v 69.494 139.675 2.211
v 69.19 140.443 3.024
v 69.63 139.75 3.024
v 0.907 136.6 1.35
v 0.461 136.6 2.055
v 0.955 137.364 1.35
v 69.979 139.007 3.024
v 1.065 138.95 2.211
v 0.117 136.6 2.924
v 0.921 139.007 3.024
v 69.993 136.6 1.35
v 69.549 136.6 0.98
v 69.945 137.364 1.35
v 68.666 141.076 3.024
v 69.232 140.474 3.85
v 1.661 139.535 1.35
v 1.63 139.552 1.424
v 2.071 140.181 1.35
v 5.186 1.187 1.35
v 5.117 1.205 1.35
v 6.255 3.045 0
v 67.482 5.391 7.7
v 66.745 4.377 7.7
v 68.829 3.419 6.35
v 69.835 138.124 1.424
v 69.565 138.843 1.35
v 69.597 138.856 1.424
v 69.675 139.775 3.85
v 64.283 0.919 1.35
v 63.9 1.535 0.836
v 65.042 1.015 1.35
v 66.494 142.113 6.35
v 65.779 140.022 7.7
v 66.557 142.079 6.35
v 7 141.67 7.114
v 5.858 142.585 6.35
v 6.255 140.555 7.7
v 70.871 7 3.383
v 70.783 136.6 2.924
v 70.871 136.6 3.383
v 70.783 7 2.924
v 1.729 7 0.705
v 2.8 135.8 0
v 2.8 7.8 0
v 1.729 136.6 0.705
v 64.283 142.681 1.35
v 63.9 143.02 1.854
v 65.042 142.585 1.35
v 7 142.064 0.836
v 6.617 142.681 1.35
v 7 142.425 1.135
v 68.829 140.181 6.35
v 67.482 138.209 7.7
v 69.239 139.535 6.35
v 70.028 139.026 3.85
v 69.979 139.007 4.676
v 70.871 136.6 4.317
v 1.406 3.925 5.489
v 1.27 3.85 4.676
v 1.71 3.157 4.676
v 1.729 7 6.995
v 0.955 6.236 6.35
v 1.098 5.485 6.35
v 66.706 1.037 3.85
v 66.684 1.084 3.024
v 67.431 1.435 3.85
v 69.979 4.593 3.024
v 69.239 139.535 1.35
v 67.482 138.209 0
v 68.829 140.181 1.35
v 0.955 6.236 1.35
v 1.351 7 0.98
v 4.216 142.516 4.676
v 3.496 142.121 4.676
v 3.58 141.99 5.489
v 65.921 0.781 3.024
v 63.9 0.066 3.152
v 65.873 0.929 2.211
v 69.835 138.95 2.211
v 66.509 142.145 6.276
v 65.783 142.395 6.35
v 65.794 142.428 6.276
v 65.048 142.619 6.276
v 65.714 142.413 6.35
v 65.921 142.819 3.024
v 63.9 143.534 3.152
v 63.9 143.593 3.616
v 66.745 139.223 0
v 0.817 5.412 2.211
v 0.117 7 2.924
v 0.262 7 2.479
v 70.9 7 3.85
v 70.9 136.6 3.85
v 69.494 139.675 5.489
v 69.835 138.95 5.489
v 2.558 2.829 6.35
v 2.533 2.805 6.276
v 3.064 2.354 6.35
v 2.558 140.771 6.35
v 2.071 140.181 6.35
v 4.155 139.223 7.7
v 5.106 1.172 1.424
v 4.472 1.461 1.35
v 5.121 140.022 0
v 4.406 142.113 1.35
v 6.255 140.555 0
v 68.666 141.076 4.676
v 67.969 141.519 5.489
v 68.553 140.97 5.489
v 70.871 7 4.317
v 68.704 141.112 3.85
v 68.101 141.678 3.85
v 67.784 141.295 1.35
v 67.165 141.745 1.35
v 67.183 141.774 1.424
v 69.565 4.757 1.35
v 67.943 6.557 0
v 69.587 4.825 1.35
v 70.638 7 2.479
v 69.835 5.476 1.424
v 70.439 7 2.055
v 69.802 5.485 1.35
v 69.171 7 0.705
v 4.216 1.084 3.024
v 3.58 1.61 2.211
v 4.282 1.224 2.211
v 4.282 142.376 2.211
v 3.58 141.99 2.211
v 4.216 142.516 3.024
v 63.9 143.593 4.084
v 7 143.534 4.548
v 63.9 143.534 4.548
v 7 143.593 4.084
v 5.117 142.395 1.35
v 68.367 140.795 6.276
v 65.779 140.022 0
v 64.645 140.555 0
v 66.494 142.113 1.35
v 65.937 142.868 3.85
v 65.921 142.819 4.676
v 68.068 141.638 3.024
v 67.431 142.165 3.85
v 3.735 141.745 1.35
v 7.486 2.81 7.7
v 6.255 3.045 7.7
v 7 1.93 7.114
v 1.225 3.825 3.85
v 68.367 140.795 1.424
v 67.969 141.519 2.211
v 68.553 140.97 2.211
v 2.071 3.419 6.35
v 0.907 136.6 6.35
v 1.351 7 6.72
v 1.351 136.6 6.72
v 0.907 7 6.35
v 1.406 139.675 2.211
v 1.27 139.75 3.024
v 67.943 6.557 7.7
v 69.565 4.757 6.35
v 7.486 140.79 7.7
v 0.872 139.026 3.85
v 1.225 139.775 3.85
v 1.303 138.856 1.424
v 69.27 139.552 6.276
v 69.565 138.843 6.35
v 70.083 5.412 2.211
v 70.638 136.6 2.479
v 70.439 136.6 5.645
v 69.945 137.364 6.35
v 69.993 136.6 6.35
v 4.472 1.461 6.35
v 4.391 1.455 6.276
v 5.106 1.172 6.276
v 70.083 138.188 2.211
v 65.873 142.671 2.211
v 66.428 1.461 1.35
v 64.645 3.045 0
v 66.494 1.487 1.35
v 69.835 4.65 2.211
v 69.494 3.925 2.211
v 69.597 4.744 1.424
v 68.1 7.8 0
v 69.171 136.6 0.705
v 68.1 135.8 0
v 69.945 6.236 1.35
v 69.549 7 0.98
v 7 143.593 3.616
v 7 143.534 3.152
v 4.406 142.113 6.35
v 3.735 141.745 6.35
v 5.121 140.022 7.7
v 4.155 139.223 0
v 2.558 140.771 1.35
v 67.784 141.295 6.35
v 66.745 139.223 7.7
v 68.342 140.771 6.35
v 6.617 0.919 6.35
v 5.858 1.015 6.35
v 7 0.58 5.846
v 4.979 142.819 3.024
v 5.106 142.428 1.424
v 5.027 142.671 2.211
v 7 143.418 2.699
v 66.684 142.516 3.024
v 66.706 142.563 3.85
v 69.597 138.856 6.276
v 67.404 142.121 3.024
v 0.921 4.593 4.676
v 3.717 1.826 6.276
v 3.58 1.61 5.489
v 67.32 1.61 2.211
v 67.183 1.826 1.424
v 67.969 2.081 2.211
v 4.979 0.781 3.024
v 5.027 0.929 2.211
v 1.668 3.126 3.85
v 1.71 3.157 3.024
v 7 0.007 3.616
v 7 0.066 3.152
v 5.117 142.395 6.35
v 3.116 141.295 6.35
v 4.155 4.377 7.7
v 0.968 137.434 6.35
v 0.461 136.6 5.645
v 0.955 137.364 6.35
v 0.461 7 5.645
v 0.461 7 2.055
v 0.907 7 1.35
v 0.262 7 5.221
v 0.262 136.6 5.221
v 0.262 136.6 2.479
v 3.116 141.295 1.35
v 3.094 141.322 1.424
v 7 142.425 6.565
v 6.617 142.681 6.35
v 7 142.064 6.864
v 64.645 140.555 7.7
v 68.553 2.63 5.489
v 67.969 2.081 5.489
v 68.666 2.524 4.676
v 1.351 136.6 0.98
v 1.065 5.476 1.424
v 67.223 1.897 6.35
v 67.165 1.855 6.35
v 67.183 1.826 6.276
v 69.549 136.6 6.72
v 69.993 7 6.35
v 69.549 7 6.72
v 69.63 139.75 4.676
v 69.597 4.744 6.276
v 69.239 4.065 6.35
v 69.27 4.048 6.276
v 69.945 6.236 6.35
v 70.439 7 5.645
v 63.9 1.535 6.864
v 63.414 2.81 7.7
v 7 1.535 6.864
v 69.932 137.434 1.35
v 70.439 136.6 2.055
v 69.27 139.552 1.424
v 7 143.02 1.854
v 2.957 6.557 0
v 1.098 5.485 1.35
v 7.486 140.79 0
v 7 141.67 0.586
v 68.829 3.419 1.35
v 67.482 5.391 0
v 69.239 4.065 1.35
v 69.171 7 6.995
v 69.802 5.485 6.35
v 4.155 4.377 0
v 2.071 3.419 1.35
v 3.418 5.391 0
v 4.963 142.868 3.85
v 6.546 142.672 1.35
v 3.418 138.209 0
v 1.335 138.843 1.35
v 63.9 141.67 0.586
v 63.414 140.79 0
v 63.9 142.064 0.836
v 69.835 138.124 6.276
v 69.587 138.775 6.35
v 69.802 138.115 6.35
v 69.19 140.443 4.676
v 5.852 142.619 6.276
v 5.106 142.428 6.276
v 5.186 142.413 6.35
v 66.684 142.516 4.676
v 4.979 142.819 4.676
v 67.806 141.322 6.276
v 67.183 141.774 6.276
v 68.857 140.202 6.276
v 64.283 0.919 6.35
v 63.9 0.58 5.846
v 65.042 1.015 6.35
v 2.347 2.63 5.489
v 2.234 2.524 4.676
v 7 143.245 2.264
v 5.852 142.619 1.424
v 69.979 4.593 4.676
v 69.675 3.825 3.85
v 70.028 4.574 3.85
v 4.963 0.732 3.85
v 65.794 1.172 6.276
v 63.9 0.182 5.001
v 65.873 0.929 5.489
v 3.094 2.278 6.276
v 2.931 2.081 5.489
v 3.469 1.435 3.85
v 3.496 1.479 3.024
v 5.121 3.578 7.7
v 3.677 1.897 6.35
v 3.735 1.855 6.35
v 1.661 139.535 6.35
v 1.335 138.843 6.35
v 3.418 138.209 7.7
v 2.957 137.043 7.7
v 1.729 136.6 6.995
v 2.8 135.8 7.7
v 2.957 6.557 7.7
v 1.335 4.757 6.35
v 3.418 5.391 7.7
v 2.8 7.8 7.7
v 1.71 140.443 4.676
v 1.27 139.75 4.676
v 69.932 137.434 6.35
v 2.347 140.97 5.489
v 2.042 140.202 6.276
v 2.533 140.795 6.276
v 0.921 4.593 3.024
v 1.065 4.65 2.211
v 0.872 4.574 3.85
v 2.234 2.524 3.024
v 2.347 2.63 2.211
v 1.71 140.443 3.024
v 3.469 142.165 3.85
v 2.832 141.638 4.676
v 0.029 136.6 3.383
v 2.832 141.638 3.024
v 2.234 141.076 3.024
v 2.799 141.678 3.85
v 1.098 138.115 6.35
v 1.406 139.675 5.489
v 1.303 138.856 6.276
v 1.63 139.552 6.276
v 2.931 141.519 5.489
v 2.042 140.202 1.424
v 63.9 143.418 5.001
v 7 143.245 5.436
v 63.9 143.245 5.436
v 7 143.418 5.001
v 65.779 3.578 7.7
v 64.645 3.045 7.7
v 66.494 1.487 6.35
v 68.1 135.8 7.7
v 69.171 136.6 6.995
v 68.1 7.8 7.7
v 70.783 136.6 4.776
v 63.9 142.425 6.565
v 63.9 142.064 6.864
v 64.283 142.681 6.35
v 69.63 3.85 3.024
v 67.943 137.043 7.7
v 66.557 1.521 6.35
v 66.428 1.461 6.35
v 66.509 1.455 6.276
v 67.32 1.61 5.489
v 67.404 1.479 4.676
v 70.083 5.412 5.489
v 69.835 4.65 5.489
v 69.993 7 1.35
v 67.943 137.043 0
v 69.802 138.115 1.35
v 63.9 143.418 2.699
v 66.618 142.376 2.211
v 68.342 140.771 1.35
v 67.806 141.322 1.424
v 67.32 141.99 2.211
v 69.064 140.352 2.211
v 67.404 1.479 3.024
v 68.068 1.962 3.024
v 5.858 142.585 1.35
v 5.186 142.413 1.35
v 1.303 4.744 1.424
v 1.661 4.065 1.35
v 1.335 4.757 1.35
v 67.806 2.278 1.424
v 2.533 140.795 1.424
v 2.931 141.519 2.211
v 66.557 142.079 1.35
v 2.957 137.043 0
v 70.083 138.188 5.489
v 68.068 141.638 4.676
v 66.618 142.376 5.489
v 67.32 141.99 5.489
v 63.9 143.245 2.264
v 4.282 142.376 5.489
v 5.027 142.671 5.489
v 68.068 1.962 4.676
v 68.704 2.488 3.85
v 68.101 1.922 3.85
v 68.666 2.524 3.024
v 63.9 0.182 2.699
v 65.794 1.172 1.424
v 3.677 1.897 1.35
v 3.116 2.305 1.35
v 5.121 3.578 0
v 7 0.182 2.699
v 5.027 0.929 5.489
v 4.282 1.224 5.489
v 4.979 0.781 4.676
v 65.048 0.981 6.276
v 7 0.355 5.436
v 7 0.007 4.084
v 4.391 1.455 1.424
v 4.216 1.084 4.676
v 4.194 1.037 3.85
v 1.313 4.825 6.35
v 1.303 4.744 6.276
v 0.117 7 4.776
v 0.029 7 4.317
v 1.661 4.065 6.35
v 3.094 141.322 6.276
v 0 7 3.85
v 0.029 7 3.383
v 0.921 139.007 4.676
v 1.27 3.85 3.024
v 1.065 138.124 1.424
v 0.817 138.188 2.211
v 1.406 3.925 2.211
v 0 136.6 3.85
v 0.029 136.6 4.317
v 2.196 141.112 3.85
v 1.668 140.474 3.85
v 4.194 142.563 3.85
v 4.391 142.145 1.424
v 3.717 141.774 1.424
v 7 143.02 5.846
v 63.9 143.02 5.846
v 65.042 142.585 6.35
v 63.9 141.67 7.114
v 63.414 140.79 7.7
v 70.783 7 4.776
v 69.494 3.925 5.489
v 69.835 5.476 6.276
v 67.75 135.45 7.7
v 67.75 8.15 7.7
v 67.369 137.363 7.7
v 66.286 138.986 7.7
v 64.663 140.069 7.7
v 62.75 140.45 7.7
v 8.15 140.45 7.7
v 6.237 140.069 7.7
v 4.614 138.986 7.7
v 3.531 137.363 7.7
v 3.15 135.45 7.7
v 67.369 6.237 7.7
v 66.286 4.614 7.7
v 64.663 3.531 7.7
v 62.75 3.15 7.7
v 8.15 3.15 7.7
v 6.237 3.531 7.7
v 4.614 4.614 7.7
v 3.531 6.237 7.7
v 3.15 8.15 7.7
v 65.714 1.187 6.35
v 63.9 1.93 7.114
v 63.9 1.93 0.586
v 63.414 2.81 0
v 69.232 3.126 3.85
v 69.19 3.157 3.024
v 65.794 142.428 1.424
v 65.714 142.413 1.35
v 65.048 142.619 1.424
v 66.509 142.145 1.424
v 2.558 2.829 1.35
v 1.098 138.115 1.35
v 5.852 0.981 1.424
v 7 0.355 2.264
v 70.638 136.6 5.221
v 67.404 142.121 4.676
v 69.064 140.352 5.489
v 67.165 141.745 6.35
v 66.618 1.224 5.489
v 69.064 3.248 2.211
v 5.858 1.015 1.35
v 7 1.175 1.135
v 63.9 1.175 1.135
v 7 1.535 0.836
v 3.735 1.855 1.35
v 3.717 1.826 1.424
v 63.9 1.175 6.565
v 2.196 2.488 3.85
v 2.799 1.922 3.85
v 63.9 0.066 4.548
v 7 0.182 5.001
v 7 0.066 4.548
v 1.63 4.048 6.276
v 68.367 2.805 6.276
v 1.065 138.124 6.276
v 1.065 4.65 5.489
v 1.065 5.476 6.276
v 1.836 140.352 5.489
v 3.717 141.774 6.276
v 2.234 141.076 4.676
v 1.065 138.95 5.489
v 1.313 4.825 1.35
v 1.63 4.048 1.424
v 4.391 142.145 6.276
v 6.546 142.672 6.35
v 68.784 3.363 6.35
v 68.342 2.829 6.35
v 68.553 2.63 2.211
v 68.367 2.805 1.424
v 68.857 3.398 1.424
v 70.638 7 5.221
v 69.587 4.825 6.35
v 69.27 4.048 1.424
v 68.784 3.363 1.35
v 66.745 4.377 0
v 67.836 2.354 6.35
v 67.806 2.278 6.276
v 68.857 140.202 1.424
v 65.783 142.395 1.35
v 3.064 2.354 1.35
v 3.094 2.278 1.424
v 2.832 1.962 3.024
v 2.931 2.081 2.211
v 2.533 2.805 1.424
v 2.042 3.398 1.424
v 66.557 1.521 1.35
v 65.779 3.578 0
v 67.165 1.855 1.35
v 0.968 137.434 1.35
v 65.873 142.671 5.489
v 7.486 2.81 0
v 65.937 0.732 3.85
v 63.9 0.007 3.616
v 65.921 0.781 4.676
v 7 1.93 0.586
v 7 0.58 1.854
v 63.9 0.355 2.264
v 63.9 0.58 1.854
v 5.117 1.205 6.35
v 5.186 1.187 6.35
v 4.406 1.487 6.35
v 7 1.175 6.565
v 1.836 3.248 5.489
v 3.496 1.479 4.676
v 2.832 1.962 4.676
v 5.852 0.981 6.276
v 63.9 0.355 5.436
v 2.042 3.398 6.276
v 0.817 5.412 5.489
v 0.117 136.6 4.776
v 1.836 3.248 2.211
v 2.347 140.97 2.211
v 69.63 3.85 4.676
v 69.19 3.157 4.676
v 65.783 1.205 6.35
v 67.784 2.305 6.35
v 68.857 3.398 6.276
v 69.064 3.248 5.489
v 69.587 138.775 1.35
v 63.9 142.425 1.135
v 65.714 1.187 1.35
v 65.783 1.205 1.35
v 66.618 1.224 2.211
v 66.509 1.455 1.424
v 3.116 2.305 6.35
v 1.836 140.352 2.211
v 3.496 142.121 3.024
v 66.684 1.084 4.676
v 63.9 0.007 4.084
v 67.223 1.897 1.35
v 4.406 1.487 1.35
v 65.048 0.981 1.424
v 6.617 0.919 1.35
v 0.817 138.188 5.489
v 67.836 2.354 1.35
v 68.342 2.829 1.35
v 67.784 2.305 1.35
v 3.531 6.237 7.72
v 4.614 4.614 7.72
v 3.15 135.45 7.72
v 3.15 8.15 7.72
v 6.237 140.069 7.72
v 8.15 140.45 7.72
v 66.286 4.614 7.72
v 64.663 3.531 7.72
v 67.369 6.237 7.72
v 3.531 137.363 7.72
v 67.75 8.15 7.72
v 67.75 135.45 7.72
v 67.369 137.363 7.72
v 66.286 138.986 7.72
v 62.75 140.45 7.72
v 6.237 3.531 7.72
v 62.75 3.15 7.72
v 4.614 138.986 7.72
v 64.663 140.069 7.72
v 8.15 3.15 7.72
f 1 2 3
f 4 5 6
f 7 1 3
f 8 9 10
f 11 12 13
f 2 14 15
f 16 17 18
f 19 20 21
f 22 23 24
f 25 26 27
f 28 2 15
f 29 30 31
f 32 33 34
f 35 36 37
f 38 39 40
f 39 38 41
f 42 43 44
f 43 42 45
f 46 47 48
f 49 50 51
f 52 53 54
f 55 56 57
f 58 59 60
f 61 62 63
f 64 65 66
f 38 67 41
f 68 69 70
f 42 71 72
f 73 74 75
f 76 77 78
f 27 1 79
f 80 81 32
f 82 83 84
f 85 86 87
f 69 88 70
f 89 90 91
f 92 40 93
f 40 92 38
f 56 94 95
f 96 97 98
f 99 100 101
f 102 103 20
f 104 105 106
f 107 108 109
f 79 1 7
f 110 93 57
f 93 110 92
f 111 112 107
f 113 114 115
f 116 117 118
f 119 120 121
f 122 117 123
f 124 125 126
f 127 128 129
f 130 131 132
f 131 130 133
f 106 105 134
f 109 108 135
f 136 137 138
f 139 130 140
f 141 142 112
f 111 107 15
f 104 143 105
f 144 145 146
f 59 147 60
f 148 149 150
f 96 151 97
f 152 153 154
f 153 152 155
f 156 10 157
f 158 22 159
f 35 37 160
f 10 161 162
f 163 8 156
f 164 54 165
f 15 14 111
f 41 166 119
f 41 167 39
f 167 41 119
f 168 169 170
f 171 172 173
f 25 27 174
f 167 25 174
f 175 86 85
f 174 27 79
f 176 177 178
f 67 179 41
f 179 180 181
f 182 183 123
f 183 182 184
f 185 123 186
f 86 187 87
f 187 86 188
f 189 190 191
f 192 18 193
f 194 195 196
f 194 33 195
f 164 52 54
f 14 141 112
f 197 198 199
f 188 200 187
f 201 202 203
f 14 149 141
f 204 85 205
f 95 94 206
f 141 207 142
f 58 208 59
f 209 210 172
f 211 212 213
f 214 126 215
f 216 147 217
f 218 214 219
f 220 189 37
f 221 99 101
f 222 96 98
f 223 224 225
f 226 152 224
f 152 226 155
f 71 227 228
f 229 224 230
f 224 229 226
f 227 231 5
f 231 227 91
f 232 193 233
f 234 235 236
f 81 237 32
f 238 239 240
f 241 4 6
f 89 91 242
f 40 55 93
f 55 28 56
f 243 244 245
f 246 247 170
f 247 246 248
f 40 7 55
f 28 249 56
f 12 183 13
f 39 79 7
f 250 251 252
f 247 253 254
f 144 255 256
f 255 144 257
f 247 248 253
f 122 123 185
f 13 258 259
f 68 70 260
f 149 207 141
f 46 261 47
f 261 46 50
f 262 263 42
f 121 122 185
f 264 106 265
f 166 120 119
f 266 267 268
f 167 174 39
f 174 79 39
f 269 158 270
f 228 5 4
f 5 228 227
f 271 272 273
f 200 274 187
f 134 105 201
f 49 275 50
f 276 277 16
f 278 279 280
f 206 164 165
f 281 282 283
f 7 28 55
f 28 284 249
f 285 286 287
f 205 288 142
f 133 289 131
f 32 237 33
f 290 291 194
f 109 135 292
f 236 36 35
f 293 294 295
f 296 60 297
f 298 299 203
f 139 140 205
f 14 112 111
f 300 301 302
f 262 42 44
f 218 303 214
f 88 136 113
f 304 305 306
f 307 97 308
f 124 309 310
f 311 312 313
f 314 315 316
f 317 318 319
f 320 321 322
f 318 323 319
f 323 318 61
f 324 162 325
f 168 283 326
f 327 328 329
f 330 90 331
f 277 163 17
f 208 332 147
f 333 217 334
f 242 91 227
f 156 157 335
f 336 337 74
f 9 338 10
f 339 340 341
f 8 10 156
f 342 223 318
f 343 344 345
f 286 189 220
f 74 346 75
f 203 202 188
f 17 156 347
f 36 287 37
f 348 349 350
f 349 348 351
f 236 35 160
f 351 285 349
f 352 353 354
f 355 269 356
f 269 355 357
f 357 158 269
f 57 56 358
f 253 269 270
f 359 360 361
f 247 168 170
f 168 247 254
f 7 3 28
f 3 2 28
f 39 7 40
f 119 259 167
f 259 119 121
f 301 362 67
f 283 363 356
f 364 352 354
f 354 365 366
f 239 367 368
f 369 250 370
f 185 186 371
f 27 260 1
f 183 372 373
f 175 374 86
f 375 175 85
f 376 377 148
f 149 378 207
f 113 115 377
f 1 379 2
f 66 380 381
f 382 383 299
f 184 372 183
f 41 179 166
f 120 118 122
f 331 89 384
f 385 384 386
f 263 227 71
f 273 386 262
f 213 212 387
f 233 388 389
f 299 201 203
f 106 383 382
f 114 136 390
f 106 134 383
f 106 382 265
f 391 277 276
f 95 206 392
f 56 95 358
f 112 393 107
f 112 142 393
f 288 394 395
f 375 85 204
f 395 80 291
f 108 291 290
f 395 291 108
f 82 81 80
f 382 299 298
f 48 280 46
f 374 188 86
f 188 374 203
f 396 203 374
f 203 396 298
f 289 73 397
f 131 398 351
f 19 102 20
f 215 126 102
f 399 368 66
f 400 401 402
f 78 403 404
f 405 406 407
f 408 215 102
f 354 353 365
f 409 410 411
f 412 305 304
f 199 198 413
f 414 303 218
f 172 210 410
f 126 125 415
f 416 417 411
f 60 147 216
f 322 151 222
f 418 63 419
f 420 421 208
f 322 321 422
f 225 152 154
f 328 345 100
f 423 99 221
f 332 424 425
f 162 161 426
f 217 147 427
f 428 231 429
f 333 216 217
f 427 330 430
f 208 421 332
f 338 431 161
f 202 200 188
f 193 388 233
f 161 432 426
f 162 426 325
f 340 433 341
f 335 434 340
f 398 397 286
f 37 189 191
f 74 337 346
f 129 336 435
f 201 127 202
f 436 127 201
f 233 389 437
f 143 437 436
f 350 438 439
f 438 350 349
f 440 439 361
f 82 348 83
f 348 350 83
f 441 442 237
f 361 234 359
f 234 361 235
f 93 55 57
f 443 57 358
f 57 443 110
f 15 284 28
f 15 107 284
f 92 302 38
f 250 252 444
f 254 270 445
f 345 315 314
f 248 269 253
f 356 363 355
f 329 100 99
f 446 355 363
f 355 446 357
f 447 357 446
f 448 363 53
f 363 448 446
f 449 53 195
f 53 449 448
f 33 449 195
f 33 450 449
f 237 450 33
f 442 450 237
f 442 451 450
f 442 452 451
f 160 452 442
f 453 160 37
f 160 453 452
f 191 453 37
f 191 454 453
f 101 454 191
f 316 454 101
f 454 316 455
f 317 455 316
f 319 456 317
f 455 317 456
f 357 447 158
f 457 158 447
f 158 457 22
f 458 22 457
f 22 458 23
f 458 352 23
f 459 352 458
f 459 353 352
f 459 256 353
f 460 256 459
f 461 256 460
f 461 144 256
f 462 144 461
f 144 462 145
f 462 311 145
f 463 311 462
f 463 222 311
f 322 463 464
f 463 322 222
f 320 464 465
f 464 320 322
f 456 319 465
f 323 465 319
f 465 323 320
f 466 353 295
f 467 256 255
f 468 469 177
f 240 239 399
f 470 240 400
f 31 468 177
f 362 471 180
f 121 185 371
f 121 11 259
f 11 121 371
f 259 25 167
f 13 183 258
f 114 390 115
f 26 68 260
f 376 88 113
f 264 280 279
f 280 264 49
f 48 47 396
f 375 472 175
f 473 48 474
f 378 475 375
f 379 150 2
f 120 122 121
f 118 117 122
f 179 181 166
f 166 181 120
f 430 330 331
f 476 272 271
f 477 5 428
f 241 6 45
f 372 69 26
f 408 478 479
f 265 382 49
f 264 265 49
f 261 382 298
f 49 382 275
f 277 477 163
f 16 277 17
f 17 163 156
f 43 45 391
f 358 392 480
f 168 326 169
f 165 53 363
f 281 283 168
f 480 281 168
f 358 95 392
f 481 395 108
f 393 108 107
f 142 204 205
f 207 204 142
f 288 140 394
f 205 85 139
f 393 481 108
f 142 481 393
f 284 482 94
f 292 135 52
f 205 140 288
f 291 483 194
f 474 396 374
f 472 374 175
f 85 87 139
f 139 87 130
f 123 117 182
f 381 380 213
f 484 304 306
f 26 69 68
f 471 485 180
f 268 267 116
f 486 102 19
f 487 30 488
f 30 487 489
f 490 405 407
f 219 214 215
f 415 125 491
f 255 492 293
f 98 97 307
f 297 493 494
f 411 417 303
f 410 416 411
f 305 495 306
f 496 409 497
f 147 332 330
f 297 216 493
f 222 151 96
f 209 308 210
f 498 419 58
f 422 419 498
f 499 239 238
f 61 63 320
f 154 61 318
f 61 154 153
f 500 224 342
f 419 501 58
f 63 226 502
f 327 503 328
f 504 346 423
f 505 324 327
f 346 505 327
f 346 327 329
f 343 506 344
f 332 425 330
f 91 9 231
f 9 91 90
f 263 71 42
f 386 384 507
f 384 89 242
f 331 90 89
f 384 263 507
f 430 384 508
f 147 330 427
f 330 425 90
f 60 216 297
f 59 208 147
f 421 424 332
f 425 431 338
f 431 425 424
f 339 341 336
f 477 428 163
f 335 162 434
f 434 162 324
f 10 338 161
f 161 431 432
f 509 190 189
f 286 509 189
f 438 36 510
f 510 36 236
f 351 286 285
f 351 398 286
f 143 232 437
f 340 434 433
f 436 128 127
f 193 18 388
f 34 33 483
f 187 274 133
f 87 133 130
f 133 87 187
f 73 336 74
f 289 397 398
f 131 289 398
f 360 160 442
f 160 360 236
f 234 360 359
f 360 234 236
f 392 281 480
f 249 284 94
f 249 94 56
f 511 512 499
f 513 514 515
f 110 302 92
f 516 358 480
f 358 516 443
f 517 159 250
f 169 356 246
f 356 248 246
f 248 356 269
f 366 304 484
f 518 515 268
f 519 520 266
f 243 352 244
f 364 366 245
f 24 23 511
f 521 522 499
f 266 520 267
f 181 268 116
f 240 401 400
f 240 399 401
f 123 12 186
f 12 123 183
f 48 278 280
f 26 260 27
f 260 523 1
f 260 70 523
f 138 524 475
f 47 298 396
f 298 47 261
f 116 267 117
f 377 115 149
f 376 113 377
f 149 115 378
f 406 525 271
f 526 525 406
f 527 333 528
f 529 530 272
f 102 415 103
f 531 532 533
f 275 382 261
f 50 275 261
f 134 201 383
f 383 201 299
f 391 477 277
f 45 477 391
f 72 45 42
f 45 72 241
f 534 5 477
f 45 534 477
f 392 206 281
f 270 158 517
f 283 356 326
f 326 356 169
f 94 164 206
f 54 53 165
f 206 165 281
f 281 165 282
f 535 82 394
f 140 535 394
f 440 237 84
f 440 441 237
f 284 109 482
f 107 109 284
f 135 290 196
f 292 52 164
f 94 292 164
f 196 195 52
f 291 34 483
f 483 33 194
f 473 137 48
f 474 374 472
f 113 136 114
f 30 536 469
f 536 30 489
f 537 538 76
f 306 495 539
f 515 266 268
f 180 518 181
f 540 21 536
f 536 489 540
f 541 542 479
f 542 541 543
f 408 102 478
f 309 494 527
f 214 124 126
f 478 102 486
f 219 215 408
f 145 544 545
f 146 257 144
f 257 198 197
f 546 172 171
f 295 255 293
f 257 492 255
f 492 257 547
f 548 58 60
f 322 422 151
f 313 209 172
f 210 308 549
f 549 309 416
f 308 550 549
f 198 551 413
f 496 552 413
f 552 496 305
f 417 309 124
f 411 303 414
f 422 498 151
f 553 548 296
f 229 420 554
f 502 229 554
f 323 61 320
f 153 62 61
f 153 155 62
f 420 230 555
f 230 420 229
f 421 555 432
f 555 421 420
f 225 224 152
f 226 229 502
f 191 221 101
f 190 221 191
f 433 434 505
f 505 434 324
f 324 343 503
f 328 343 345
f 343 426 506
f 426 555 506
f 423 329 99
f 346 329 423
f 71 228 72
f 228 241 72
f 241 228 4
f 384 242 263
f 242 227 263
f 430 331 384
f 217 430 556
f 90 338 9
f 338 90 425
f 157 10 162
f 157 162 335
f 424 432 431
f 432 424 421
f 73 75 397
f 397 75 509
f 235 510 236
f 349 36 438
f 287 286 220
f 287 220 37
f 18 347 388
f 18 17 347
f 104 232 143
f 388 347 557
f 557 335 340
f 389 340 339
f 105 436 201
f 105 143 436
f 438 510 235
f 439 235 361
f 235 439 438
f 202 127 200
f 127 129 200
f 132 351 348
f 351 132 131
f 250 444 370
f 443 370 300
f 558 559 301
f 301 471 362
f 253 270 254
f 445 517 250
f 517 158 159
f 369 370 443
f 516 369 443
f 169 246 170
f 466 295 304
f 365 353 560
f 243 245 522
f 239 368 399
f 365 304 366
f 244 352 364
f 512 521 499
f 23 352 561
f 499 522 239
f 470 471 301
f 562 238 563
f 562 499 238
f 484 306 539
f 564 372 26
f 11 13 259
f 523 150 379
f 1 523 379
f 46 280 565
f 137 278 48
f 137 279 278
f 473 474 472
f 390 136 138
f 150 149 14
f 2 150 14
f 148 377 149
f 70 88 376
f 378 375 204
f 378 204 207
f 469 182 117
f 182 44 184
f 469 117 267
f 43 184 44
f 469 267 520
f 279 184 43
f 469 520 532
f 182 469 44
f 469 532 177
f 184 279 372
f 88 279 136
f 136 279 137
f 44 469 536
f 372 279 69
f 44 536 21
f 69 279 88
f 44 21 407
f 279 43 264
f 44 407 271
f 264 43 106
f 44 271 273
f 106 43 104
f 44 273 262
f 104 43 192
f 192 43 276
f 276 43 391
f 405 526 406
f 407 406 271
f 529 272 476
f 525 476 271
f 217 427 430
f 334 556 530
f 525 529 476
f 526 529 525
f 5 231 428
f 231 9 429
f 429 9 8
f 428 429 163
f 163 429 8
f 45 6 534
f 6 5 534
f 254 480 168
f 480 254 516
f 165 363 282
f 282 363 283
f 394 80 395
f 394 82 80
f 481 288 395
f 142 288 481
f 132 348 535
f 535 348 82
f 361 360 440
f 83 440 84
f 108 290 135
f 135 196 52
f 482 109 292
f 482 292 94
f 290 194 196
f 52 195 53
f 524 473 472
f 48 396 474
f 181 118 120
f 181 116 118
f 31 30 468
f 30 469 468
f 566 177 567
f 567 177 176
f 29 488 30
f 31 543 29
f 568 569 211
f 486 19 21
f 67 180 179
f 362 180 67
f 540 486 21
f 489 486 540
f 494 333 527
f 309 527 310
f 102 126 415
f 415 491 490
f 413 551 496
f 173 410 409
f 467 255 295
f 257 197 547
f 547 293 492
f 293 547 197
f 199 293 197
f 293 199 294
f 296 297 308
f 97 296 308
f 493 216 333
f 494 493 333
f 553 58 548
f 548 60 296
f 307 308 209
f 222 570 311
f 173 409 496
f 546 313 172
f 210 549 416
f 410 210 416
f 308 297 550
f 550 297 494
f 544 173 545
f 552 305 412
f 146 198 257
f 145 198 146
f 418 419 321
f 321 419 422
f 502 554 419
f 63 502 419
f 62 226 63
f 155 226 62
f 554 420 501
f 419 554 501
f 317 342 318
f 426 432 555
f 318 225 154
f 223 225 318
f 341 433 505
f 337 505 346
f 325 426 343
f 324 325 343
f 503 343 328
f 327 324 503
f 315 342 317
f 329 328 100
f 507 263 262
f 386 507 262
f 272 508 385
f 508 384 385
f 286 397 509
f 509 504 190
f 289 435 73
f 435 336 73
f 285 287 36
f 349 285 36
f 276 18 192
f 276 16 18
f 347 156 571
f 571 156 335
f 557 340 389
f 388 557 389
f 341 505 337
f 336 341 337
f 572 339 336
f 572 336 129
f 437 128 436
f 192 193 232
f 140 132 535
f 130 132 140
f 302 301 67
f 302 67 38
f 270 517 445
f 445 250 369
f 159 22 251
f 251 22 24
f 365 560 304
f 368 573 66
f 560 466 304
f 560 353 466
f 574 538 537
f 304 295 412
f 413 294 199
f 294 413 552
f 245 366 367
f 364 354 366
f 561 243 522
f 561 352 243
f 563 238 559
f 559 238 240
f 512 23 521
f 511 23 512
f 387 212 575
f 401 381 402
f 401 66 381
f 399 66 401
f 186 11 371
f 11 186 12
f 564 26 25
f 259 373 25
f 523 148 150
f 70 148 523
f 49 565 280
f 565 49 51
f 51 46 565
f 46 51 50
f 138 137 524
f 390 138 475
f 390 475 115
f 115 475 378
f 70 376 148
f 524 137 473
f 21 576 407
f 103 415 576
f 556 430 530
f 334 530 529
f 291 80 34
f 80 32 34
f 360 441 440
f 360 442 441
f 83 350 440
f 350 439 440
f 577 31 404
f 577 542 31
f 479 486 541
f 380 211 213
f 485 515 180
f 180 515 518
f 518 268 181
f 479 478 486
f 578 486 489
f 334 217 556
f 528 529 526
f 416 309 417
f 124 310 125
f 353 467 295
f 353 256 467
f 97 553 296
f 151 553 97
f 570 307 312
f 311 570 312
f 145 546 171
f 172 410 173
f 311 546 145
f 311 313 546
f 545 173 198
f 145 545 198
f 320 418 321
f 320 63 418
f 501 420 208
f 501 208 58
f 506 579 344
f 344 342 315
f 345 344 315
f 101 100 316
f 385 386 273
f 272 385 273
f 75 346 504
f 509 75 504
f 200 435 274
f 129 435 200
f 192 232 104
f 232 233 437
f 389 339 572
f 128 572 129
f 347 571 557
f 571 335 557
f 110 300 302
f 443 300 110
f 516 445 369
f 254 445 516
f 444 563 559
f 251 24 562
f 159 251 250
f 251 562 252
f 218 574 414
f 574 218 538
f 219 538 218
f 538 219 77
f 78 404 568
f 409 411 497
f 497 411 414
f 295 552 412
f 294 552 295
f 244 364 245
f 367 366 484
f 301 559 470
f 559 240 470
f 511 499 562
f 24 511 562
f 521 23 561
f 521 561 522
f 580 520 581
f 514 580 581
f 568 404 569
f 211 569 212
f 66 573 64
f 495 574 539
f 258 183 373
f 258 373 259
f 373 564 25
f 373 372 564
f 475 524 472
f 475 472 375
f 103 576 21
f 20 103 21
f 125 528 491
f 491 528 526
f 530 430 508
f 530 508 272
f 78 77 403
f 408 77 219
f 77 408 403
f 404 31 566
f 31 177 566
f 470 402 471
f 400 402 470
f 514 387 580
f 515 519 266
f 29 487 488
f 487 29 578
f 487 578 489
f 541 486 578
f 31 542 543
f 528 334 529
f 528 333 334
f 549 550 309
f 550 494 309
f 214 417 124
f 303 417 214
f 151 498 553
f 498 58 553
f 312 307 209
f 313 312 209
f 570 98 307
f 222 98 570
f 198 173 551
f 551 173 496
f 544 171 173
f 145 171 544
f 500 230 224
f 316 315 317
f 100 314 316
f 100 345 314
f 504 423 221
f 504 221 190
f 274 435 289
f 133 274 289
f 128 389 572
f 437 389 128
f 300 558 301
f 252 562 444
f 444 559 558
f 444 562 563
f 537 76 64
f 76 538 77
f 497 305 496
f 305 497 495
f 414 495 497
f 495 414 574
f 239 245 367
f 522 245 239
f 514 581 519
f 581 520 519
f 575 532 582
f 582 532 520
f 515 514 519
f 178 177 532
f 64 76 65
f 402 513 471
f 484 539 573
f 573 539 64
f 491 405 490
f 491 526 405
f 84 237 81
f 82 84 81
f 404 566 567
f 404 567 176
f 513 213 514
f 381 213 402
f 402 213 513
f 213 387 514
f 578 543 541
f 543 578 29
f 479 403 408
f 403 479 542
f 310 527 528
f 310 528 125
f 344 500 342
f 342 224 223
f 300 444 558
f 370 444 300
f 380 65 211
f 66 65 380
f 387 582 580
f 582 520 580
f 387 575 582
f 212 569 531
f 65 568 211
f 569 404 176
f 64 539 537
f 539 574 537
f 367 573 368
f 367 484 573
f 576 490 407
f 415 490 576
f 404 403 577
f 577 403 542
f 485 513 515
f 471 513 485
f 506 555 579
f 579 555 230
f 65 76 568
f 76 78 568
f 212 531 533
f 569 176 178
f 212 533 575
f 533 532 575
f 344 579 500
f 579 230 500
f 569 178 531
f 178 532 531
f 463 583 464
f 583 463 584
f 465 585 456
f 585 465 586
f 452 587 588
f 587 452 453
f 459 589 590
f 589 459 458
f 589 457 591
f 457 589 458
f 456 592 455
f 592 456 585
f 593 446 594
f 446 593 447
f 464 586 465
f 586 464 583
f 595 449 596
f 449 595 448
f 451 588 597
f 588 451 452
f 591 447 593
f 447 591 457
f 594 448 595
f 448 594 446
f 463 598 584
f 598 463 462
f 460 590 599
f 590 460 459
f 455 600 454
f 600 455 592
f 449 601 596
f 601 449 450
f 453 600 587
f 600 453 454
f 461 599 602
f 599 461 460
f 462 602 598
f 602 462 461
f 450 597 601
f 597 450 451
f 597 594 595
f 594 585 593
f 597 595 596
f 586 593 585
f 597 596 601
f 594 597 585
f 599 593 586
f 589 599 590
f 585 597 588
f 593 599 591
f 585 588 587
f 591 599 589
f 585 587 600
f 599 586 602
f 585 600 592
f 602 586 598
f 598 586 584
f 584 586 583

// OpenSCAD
/*

  iPhone X Mechanical Mockups

  Modeled by David Crook
  14-Sep-2017
  https://www.idcrook.com

  Thingiverse:
    http://www.thingiverse.com/thing:458102/

  GitHub:
    https://github.com/idcrook/psychic-winner/tree/master/iphone_x_mockup

  Partly inspired by:
  - http://www.thingiverse.com/thing:458102/


  NOTES:

  - OpenSCAD generation relies on the MCAD library (https://github.com/openscad/MCAD)

  */


// * All measurements in millimeters * //


use <MCAD/2Dshapes.scad>

// very small number
e = 0.02;

/// Left side buttons

volume_up__height   =  5.7;
volume_up__depth    =  3.0;
volume_up__from_top = 42.0;
volume_up__curve_radius = 42.0;

volume_down__height   =  5.7;
volume_down__depth    =  3.0;
volume_down__from_top = 31.0;
volume_down__curve_radius = 31.0;

ringsilent_switch_cutout__height = 5.0;
ringsilent_switch_cutout__depth = 3.0;
ringsilent_switch_cutout__from_top = 3.0;
ringsilent_switch_cutout__curve_radius = 3.0;

// Face and sensors

truedepth_camera_sensor_bar__height   = 5.0;
truedepth_camera_sensor_bar__width    = 3.0;
truedepth_camera_sensor_bar__from_top = 3.0;
truedepth_camera_sensor_bar__curve_radius = 3.0;

speaker_top__height       = 5.0;
speaker_top__width        = 3.0;
speaker_top__from_top     = 3.0;
speaker_top__curve_radius = 3.0;

microphone_top__height       = 5.0;
// microphone_top__width        = 3.0;
microphone_top__from_top     = 3.0;
microphone_top__from_right   = 3.0;
microphone_top__curve_radius = 3.0;

display__width     =  60.0;
display__height    = 135.0;
display__recessed  =   0.0;
display__from_top  =   0.0;
display__from_right  =   0.0;

/// Right side buttons

side_button__height   =  5.7;
side_button__depth    =  3.0;
side_button__from_top = 31.0;
side_button__curve_radius = 31.0;

sim_slot__height   =  5.7;
sim_slot__depth    =  3.0;
sim_slot__from_top = 31.0;
sim_slot__curve_radius = 31.0;

/// Bottom sensors and connectors

speaker_bottom__depth        = 5.0;
speaker_bottom__width        = 3.0;
speaker_bottom__from_right   = 3.0;
speaker_bottom__curve_radius = 3.0;

microphone_bottom__depth        = 5.0;
microphone_bottom__width        = 3.0;
microphone_bottom__from_right   = 3.0;
microphone_bottom__curve_radius = 3.0;

lightning_connector__depth        = 5.0;
lightning_connector__width        = 3.0;
lightning_connector__from_right   = 3.0;
lightning_connector__curve_radius = 3.0;

bottom_right_grill__width        = 3.0;
bottom_right_grill__hole_radius  = 3.0;
bottom_right_grill__hole_count  = 5;
bottom_right_grill__from_right   = 3.0;





model_quality = 25;

//

module iphone_x (width, length, depth, corner_radius, edge_radius)
  {

    shell(width, length, depth, corner_radius, edge_radius);




  }



/// Utility modules


module shell(width, length, depth, corner_radius, edge_radius)
{
  face_corner_radius = corner_radius;

  // Try to parameterize the curves
  corner_r1 = face_corner_radius - 2;
  corner_r2 = face_corner_radius - 2 ;

  edge_curvature_radius = edge_radius;
  edge_offset = edge_curvature_radius;

  corner_sphere_r = face_corner_radius - (corner_radius - edge_radius)/8;


  round_rect_offset_factor = 0.40 * face_corner_radius;
  display_round_rect_offset_factor = 0.45 * face_corner_radius;
  display_inset_depth = 0.8;

  length_edge_extr_height = length - 2*face_corner_radius;
  width_edge_extr_height  = width  - 2*face_corner_radius ;
  corner_sphere_chop_height = 5;


  // generate the basic solid outline
  {
    difference() {

      // most of body
      hull($fn = 25)
      // DEBUG
      //% union($fn = 25)
      {

	// main rectangular region
	translate([round_rect_offset_factor,
		   round_rect_offset_factor,
		   0])
	{
	  linear_extrude(height = depth, center = false, convexity = 10)
	    complexRoundSquare([ width - 2*round_rect_offset_factor,
				 length - 2*round_rect_offset_factor ],
			       [corner_r1, corner_r2],
			       [corner_r1, corner_r2],
			       [corner_r1, corner_r2],
			       [corner_r1, corner_r2],
			       center=false);
	}


	// lower left corner
	translate([face_corner_radius, face_corner_radius, depth/2])
	{
	  intersection() {
	    sphere(r = corner_sphere_r, $fn = 50);
	    cube(size = [20, 20, corner_sphere_chop_height], center = true);
	  }
	}

	// left length side
	translate([edge_curvature_radius, face_corner_radius, depth/2]) {

	  rotate([-90,0,0])
	    linear_extrude(height = length_edge_extr_height, center = false)
	    projection(cut = true)
	    sphere(r = edge_curvature_radius, $fn = 50) ;
	}

	// bottom width side
	translate([face_corner_radius, edge_curvature_radius, depth/2]) {
	  rotate([0,90,0])
	    linear_extrude(height = width_edge_extr_height, center = false)
	    projection(cut = true)
	    sphere(r = edge_curvature_radius, $fn = 50) ;
	}

	// upper left corner
	translate([face_corner_radius, length - face_corner_radius, depth/2])
	{
	  intersection() {
	    sphere(r = corner_sphere_r, $fn = 50);
	    cube(size = [20, 20, corner_sphere_chop_height], center = true);
	  }
	}

	// upper right corner
	translate([width - face_corner_radius, length - face_corner_radius, depth/2])
	{
	  intersection() {
	    sphere(r = corner_sphere_r, $fn = 50);
	    cube(size = [20, 20, corner_sphere_chop_height], center = true);
	  }
	}

	// right length side
	translate([width - edge_curvature_radius, length- face_corner_radius, depth/2]) {
	  rotate([90,0,0])
	    linear_extrude(height = length_edge_extr_height, center = false)
	    projection(cut = true)
	    sphere(r = edge_curvature_radius, $fn = 50) ;
	}

	// top width side
	translate([width - face_corner_radius, length- edge_curvature_radius, depth/2]) {
	  rotate([0,-90,0])
	    linear_extrude(height = width_edge_extr_height, center = false)
	    projection(cut = true)
	    sphere(r = edge_curvature_radius, $fn = 50) ;
	}

	// lower right corner
	translate([width - face_corner_radius, face_corner_radius, depth/2])
	{
	  intersection() {
	    sphere(r = corner_sphere_r, $fn = 50);
	    cube(size = [20, 20, corner_sphere_chop_height], center = true);
	  }
	}


      }

    }
    // display main rectangular region
    translate([display_round_rect_offset_factor,
	       display_round_rect_offset_factor,
	       depth - display_inset_depth])
    {
      color ("Black", alpha = 0.92)
	linear_extrude(height = display_inset_depth + e, center = false, convexity = 10)
	complexRoundSquare([ width - 2*display_round_rect_offset_factor,
			     length - 2*display_round_rect_offset_factor ],
			   [corner_r1, corner_r2],
			   [corner_r1, corner_r2],
			   [corner_r1, corner_r2],
			   [corner_r1, corner_r2],
			   center=false);
    }


  }
}



// Create it!
/// Gross iphone dimensions
iphone_x__height = 143.6;
iphone_x__width  =  70.9;
iphone_x__depth  =   7.7;
iphone_x__face_corner_radius = 7.0;
iphone_x__edge_radius = (iphone_x__depth - 0.25) / 2 ;


iphone_x(iphone_x__width, iphone_x__height, iphone_x__depth, iphone_x__face_corner_radius, iphone_x__edge_radius);
